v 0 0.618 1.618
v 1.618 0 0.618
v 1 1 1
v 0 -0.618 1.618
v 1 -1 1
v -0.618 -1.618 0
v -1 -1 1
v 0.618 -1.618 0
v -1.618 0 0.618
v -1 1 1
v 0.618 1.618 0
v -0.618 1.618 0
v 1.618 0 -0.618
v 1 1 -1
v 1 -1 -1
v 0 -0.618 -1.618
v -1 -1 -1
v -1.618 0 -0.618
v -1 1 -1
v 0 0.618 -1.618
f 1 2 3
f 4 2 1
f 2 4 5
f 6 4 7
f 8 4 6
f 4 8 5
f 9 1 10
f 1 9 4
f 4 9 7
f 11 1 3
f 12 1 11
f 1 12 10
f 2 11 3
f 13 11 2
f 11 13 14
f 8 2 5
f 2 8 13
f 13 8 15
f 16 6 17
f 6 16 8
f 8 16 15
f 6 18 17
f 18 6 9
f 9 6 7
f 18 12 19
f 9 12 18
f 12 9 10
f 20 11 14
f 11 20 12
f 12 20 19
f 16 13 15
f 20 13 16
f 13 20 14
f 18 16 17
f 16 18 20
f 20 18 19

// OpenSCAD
/*
    test_dodeca.scad
*/

Cphi = (sqrt(5)+1)/2;

/*
    Cartesian coordinates for a dodecahedron
*/
dodeca_cart = [ 
[+1, +1, +1], // 0, 0
[+1, -1, +1], // 0, 1
[-1, -1, +1], // 0, 2
[-1, +1, +1], // 0, 3

[+1, +1, -1], // 1, 4
[-1, +1, -1], // 1, 5
[-1, -1, -1], // 1, 6
[+1, -1, -1], // 1, 7

[0, +1/Cphi, +Cphi], // 2, 8
[0, -1/Cphi, +Cphi], // 2, 9
[0, -1/Cphi, -Cphi], // 2, 10
[0, +1/Cphi, -Cphi], // 2, 11

[-1/Cphi, +Cphi, 0], // 3, 12
[+1/Cphi, +Cphi, 0], // 3, 13
[+1/Cphi, -Cphi, 0], // 3, 14
[-1/Cphi, -Cphi, 0], // 3, 15

[-Cphi, 0, +1/Cphi], // 4, 16
[+Cphi, 0, +1/Cphi], // 4, 17
[+Cphi, 0, -1/Cphi], // 4, 18
[-Cphi, 0, -1/Cphi], // 4, 19
];



dodecahedron = [
    // points
    dodeca_cart,
    
    // faces
    [
        [1,9,8,0,17],
        [9,1,14,15,2],
        [9,2,16,3,8],
        [8,3,12,13,0],
        [0,13,4,18,17],
        [1,17,18,7,14],
        [15,14,7,10,6],
        [2,15,6,19,16],
        [16,19,5,12,3],
        [12,5,11,4,13],
        [18,4,11,10,7],
        [19,6,10,11,5]
    ]
];

polyhedron(points = dodecahedron[0], faces = dodecahedron[1]);
